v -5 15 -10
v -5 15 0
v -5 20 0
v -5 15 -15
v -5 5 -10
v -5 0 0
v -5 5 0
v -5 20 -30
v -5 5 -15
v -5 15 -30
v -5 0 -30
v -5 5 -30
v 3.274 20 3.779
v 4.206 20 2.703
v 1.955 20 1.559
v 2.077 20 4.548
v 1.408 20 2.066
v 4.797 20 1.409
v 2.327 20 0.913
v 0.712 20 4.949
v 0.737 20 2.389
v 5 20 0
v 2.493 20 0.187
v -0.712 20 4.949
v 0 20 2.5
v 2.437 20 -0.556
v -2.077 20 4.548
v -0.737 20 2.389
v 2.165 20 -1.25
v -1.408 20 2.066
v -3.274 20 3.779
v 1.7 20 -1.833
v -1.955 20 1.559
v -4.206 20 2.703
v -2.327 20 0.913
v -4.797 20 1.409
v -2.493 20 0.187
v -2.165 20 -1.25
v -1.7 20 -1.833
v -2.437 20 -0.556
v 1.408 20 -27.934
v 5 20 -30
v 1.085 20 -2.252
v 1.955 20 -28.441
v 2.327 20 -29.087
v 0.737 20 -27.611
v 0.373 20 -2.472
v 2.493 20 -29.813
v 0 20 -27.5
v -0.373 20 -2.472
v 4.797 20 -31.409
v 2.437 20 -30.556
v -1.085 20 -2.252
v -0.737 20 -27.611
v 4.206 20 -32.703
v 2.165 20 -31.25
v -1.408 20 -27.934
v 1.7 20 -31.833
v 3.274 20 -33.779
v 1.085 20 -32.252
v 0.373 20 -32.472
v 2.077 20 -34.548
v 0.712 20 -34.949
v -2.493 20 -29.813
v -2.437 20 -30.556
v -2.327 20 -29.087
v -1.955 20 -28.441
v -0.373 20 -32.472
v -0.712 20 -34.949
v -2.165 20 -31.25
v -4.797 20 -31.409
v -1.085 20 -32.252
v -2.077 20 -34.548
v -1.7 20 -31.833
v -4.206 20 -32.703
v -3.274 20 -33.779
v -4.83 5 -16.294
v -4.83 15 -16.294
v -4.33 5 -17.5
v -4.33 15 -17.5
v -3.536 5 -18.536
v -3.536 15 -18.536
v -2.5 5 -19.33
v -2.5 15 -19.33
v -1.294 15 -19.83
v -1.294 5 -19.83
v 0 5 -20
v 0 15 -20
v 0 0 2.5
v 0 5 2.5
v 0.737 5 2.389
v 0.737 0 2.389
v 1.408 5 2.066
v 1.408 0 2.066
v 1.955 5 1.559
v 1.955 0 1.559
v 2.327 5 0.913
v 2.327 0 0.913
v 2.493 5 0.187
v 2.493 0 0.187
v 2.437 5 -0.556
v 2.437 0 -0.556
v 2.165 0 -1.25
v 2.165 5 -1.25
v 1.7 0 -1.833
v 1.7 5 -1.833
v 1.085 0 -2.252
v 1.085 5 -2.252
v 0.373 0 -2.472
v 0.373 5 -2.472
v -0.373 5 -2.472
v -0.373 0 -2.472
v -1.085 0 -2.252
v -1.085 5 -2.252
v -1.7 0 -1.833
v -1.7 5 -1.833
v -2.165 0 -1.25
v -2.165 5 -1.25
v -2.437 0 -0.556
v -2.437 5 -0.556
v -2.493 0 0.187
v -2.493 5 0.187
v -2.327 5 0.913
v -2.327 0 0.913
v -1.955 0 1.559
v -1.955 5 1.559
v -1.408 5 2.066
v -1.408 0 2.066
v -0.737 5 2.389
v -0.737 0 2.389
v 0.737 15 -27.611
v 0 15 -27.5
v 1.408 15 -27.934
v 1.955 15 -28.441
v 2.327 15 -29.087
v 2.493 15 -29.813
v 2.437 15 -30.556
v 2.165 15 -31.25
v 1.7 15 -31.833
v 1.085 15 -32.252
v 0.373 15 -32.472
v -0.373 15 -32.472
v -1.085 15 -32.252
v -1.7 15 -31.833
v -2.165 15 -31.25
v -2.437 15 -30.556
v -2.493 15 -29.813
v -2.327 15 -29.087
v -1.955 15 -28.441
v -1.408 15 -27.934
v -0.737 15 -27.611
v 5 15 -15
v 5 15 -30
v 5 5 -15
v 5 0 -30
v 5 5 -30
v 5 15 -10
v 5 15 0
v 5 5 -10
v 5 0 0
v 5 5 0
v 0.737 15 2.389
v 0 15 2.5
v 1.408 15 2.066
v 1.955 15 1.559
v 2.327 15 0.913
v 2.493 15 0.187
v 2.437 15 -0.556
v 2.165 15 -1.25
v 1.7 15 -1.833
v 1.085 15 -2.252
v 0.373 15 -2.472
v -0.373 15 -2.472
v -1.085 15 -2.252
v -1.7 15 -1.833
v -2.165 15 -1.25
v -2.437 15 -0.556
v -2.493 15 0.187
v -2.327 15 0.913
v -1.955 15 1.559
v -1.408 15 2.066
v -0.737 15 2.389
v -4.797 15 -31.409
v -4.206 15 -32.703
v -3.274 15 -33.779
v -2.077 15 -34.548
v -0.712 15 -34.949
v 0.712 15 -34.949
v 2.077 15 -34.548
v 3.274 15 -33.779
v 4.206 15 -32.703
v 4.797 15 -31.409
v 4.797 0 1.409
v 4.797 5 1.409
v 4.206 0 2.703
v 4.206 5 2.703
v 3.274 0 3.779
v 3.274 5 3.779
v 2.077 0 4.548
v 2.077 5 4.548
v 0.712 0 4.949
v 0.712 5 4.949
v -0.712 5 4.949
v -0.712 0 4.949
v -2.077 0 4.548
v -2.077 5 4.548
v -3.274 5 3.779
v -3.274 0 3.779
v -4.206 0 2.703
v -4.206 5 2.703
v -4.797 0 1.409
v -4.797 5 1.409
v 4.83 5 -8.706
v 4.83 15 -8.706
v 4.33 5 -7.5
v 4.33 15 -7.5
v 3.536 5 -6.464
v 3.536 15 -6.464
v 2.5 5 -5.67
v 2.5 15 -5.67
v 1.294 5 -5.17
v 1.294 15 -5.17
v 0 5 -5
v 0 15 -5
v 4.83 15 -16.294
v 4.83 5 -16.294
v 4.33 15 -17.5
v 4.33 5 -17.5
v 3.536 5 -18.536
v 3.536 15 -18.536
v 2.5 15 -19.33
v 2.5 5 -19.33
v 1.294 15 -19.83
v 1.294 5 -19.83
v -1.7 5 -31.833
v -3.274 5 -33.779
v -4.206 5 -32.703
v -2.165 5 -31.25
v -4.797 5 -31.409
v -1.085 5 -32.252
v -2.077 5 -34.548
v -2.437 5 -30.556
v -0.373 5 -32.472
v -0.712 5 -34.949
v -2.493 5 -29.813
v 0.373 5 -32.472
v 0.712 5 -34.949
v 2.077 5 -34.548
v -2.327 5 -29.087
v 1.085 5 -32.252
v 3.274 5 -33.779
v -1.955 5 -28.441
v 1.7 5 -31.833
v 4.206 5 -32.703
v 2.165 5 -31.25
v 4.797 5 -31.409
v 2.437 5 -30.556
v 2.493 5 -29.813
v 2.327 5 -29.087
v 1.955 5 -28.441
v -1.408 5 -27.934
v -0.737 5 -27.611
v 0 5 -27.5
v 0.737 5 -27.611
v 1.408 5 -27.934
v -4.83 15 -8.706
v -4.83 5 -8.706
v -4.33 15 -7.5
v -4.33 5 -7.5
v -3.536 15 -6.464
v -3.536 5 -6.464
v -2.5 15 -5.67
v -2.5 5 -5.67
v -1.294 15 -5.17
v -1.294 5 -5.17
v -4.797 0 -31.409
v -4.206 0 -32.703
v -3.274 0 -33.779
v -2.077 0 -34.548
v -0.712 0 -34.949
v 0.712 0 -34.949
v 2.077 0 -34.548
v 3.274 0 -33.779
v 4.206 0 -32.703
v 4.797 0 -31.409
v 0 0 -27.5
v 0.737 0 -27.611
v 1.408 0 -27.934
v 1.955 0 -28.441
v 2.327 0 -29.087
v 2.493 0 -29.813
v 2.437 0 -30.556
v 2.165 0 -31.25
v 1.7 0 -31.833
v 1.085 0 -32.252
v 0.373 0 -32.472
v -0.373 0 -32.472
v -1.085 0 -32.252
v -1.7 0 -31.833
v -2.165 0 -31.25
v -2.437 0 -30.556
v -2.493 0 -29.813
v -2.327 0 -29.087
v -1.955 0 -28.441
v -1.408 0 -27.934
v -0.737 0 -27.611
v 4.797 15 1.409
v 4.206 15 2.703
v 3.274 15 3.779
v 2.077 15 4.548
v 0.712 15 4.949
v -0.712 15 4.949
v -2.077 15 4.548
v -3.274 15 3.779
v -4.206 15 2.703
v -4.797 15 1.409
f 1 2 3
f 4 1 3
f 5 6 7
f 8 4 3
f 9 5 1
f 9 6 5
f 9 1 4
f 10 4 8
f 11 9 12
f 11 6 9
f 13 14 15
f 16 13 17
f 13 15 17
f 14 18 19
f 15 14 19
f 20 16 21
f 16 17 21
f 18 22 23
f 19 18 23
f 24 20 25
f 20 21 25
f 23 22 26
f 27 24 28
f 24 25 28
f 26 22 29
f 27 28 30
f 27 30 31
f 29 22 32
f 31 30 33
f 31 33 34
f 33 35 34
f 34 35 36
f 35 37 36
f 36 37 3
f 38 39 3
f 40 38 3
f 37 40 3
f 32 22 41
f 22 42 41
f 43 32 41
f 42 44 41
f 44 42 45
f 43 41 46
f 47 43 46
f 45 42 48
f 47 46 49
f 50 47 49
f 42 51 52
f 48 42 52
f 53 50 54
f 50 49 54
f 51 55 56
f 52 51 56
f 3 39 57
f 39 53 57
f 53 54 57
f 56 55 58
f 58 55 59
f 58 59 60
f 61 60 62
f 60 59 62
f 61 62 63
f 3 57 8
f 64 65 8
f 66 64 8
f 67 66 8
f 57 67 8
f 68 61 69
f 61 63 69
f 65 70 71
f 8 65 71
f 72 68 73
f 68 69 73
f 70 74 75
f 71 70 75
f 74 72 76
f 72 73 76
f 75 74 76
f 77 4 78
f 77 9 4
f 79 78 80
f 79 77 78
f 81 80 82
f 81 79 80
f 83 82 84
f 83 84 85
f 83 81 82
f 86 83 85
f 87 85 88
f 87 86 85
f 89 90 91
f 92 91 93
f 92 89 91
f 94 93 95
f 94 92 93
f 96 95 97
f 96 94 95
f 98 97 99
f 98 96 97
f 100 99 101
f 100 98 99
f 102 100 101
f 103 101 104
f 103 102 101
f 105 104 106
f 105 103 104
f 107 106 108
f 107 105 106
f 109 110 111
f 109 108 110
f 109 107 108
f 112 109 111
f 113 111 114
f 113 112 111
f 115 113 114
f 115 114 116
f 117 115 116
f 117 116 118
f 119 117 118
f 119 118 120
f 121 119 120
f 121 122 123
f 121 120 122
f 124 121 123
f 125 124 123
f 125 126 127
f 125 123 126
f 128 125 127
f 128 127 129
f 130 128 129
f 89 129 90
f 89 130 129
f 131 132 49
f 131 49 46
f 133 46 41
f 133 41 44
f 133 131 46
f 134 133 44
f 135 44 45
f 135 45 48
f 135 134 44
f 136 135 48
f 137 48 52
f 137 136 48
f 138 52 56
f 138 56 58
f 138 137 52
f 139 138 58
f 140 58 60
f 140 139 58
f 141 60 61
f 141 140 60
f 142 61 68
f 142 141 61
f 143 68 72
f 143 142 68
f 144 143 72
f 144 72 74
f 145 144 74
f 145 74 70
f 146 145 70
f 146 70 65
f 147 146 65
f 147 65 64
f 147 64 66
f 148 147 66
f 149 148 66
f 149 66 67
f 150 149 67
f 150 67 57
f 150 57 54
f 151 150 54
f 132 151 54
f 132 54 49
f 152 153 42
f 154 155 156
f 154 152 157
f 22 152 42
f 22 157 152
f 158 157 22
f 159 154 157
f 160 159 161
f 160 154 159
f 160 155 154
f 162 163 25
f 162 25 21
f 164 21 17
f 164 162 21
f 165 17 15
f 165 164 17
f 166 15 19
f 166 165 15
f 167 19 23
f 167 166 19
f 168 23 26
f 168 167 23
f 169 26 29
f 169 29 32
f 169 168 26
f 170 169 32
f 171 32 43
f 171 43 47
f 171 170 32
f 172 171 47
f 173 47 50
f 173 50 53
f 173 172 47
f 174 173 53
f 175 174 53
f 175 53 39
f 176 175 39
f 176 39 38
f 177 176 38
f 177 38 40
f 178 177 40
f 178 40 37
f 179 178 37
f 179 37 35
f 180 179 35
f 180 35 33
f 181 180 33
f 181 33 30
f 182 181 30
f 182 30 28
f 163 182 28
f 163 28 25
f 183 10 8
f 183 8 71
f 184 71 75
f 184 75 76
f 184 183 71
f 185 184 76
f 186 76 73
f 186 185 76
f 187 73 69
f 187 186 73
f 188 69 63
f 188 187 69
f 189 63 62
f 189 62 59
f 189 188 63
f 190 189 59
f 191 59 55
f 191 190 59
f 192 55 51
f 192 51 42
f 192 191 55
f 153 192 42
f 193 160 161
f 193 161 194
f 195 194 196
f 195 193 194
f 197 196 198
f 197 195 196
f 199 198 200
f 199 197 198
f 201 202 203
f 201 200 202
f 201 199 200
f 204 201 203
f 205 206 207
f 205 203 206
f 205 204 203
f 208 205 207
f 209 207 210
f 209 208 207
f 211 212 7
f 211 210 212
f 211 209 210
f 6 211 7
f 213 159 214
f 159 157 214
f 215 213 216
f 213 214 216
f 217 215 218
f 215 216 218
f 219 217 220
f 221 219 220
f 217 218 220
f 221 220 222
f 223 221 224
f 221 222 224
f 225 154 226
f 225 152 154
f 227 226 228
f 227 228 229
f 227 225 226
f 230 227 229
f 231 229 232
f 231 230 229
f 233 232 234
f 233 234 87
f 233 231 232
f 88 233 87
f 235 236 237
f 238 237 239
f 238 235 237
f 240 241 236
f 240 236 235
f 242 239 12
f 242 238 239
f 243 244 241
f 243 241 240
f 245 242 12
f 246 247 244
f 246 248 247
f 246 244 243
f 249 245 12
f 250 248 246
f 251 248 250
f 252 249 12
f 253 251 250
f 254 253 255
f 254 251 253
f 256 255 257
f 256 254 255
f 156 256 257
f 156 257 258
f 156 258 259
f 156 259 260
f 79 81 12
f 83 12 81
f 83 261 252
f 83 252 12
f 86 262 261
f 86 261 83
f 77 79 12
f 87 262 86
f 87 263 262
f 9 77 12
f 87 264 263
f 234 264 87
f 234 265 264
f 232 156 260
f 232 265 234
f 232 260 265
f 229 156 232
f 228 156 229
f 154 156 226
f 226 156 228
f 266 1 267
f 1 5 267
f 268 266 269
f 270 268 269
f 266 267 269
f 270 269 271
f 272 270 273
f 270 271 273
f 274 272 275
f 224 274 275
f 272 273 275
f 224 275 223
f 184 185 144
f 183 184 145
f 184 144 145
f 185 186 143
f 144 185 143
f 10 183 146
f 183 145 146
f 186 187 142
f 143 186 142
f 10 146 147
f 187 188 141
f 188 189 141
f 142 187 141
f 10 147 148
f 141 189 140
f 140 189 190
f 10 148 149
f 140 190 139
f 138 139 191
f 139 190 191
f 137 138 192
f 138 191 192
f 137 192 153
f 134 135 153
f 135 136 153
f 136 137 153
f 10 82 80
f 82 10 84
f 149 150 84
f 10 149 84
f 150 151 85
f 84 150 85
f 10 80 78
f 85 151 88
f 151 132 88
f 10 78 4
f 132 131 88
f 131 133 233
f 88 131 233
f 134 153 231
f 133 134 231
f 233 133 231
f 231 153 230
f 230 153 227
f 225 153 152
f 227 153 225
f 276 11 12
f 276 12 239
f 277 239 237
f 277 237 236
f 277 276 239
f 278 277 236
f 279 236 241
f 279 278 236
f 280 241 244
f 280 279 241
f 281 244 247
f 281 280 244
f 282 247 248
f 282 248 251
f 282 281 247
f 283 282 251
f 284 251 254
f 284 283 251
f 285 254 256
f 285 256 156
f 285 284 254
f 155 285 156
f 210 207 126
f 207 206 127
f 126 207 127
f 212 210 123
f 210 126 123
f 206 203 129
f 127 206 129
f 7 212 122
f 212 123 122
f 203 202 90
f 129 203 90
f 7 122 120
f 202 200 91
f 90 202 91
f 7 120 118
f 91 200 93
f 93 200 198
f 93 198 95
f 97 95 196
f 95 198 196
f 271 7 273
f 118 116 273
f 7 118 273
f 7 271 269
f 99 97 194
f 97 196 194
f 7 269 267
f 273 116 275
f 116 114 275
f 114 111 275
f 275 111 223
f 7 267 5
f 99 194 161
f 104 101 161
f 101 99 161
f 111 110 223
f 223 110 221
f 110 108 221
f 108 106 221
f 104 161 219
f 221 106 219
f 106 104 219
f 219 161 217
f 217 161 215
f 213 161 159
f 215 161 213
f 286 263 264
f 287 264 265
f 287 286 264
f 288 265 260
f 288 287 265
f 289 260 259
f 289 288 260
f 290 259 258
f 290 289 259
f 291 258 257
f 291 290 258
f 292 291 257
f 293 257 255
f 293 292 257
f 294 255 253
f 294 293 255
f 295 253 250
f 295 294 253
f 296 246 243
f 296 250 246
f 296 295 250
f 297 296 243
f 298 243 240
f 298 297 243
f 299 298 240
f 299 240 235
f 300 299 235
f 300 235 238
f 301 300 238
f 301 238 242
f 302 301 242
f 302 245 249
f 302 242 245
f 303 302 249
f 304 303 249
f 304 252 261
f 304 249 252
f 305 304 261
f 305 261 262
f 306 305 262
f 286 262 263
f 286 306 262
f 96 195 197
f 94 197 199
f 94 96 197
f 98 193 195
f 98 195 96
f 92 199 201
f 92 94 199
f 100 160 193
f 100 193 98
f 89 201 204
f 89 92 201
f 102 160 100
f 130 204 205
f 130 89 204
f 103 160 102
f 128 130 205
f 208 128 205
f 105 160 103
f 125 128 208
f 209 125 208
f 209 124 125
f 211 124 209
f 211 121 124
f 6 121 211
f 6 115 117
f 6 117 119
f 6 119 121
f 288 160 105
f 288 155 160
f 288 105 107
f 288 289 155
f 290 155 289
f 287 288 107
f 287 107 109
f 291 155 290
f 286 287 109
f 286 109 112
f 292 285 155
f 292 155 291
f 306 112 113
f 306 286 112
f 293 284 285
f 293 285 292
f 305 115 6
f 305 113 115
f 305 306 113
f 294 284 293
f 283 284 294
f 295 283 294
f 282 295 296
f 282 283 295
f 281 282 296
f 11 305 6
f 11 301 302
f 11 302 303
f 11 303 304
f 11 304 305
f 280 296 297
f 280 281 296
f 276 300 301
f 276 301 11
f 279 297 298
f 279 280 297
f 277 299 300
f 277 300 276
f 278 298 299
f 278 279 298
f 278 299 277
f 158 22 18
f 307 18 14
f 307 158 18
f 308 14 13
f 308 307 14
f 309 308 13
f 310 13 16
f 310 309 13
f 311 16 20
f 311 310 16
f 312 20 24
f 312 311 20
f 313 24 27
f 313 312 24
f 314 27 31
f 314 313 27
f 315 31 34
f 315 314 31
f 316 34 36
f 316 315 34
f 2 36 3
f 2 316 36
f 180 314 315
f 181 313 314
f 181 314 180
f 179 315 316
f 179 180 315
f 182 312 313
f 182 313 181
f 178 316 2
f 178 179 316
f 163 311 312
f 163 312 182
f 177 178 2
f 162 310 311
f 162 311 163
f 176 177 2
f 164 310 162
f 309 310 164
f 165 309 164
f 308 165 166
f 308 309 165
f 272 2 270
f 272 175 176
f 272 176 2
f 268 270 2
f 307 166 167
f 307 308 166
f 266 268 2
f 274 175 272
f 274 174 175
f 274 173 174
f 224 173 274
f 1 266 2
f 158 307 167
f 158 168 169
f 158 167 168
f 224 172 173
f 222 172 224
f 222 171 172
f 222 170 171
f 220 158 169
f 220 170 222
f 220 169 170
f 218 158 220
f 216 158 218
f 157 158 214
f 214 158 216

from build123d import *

# Parameters (mm, degrees)
SKETCH1_R           = 2.5
BOSS_EXTRUDE1_DEPTH = 20
SKETCH2_W           = 10
SKETCH2_H           = 10
CUT_EXTRUDE1_DEPTH  = 15
FILLET1_R           = 5
SKETCH3_W           = 10
SKETCH3_H           = 10
CUT_EXTRUDE3_DEPTH  = 10
FILLET3_R           = 5


with BuildPart() as part:
    # Sketch1 → Boss-Extrude1 (new body)
    with BuildSketch(Plane(origin=(0, 0, 0), x_dir=(1, 0, 0), z_dir=(0, 1, 0))):
        with BuildLine():
            Line((-5, 0), (-5, 30))
            ThreePointArc((-5, 30), (0, 35), (5, 30))
            Line((5, 30), (5, 0))
            ThreePointArc((5, 0), (0, -5), (-5, 0))
        make_face()
        with Locations(Location((0, 30, 0), (0, 0, 270))):
            Circle(SKETCH1_R, mode=Mode.SUBTRACT)
        with Locations(Location((0, 0, 0), (0, 0, 270))):
            Circle(SKETCH1_R, mode=Mode.SUBTRACT)
    extrude(amount=BOSS_EXTRUDE1_DEPTH)

    # Sketch2 → Cut-Extrude1 (cut)
    with BuildSketch(Plane(origin=(5, 0, 0), x_dir=(0, 0, -1), z_dir=(1, 0, 0))):
        with Locations((0, 10)):
            Rectangle(SKETCH2_W, SKETCH2_H)
    cut_extrude1 = extrude(amount=-CUT_EXTRUDE1_DEPTH, mode=Mode.SUBTRACT)

    # Mirror1: Cut-Extrude1 across plane
    add(cut_extrude1.mirror(Plane.XY.offset(-15)), mode=Mode.SUBTRACT)

    # Fillet1
    fillet1_edges = [part.edges().sort_by_distance(p)[0] for p in [
        (-5, 10, -25),
        (5, 10, -25),
        (-5, 10, -5),
        (5, 10, -5),
    ]]
    fillet(fillet1_edges, radius=FILLET1_R - 0.0001)  # a hair under: the kernel refuses the full size

    # Sketch3 → Cut-Extrude3 (cut)
    with BuildSketch(Plane(origin=(5, 0, 0), x_dir=(0, 0, -1), z_dir=(1, 0, 0))):
        with Locations((25, 10)):
            Rectangle(SKETCH3_W, SKETCH3_H)
    extrude(amount=-CUT_EXTRUDE3_DEPTH, mode=Mode.SUBTRACT)

    # Fillet3
    fillet3_edges = [part.edges().sort_by_distance(p)[0] for p in [
        (-5, 10, -20.0001),
        (5, 10, -20.0001),
    ]]
    fillet(fillet3_edges, radius=FILLET3_R - 0.0001)  # a hair under: the kernel refuses the full size


solid = part.part
